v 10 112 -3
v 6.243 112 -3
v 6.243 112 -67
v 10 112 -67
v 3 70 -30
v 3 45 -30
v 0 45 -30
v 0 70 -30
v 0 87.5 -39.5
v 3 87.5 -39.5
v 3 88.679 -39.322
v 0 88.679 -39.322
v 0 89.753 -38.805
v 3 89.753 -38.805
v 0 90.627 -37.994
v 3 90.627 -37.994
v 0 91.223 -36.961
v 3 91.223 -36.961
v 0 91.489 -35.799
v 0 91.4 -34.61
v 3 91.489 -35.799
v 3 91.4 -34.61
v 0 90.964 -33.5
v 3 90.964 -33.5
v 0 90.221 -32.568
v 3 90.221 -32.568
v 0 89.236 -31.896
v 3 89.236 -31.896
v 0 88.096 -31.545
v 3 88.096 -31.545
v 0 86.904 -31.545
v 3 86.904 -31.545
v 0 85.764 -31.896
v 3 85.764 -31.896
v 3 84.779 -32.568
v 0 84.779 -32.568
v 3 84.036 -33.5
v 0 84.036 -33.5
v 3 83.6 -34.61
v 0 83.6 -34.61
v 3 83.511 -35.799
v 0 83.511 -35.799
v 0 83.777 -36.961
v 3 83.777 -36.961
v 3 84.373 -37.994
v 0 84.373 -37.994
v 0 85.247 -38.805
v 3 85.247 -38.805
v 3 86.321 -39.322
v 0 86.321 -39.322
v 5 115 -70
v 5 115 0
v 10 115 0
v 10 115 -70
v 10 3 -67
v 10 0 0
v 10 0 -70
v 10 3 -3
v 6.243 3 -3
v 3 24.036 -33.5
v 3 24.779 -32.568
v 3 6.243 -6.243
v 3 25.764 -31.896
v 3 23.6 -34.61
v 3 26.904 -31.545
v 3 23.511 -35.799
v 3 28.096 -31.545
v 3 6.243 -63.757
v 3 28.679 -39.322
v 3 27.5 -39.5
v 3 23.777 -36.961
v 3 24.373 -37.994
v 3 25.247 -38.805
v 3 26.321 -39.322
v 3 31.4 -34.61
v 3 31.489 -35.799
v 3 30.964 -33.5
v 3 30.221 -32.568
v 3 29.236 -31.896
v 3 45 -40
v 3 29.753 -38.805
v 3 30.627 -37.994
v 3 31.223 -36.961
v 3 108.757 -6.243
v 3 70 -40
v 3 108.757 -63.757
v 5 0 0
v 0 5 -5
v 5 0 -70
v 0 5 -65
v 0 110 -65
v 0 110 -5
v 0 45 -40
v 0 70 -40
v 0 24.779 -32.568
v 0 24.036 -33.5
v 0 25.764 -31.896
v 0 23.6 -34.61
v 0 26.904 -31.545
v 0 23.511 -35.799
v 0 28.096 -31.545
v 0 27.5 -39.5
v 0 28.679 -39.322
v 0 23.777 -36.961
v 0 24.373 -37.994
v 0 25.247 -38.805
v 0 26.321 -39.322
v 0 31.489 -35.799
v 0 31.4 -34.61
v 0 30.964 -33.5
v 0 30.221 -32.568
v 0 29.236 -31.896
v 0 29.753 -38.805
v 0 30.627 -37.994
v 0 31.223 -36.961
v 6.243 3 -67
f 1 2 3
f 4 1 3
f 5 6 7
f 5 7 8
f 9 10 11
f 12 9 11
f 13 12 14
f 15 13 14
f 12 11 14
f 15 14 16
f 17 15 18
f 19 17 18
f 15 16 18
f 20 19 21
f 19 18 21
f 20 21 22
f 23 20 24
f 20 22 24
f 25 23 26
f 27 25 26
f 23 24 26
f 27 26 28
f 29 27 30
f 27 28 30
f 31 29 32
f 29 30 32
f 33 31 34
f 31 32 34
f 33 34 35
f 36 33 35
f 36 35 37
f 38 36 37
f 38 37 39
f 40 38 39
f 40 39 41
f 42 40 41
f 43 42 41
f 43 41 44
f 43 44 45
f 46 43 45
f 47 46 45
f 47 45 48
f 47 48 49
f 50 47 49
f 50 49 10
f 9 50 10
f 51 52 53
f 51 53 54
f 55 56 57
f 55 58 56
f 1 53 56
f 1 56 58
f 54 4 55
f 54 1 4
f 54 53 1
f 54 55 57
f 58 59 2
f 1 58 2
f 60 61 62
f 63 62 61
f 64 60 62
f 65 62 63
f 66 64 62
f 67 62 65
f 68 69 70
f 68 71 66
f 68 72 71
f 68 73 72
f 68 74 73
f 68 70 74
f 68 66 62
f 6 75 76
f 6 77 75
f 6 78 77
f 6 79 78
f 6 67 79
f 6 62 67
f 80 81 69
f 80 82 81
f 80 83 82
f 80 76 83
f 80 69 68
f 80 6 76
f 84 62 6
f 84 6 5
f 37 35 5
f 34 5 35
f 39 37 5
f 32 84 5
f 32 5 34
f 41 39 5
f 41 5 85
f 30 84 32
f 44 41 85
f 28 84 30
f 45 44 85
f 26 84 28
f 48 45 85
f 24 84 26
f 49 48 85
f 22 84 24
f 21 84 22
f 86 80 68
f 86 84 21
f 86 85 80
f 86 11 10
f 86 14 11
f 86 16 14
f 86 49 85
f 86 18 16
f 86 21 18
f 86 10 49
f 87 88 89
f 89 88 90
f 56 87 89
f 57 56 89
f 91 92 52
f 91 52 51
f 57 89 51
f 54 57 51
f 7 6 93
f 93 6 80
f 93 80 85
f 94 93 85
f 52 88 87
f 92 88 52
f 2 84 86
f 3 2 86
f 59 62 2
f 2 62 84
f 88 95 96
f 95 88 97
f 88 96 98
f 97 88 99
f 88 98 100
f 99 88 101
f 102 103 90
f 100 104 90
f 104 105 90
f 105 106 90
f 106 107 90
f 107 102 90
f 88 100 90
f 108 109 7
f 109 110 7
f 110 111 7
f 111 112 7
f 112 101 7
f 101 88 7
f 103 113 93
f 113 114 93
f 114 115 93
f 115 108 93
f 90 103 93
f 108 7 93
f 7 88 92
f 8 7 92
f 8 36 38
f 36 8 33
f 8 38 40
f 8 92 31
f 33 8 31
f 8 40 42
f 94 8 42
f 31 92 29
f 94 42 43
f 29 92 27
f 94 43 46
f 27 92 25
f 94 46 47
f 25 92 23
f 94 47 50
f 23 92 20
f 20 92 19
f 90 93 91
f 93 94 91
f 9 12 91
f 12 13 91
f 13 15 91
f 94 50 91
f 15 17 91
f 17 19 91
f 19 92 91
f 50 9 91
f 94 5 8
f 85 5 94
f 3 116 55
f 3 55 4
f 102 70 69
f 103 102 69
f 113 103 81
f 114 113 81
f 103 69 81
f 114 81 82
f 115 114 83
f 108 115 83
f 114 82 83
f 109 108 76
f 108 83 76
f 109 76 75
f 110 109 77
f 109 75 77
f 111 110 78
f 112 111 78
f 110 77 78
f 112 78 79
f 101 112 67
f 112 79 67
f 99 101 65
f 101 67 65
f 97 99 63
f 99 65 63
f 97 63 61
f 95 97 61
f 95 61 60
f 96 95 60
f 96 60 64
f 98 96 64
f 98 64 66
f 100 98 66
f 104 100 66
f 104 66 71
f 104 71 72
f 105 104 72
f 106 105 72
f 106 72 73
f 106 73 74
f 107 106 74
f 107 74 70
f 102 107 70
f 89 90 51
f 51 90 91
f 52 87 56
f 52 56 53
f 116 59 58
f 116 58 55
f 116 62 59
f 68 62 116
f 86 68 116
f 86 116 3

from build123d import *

# Parameters (mm, degrees)
CROQUIS1_W              = 70
CROQUIS1_H              = 115
SALIENTE_EXTRUIR1_DEPTH = 10
CHAFL_N2_SIZE           = 5
VACIADO1_T              = -3
CROQUIS5_R              = 4
CROQUIS5_W              = 10
CROQUIS5_H              = 25
CORTAR_EXTRUIR1_DEPTH   = 135.810978781


with BuildPart() as part:
    # Croquis1 → Saliente-Extruir1 (new body)
    with BuildSketch(Plane(origin=(0, 0, 0), x_dir=(0, 0, -1), z_dir=(1, 0, 0))):
        with Locations((35, 57.5)):
            Rectangle(CROQUIS1_W, CROQUIS1_H)
    extrude(amount=SALIENTE_EXTRUIR1_DEPTH)

    # Chaflán2
    chafl_n2_edges = [part.edges().sort_by_distance(p)[0] for p in [
        (0, 115, -35),
        (0, 57.5, -70),
        (0, 0, -35),
        (0, 57.5, 0),
    ]]
    chamfer(chafl_n2_edges, length=CHAFL_N2_SIZE)

    # Vaciado1
    vaciado1_openings = [part.faces().sort_by_distance(p)[0] for p in [
        (10, 57.5, -35),
    ]]
    offset(amount=VACIADO1_T, openings=vaciado1_openings, kind=Kind.INTERSECTION)

    # Croquis5 → Cortar-Extruir1 (cut, through all)
    with BuildSketch(Plane(origin=(3, 0, 0), x_dir=(0, 0, -1), z_dir=(1, 0, 0))):
        with Locations((35.5, 87.5)):
            Circle(CROQUIS5_R)
        with Locations((35.5, 27.5)):
            Circle(CROQUIS5_R)
        with Locations((35, 57.5)):
            Rectangle(CROQUIS5_W, CROQUIS5_H)
    extrude(amount=-CORTAR_EXTRUIR1_DEPTH, mode=Mode.SUBTRACT)


solid = part.part
